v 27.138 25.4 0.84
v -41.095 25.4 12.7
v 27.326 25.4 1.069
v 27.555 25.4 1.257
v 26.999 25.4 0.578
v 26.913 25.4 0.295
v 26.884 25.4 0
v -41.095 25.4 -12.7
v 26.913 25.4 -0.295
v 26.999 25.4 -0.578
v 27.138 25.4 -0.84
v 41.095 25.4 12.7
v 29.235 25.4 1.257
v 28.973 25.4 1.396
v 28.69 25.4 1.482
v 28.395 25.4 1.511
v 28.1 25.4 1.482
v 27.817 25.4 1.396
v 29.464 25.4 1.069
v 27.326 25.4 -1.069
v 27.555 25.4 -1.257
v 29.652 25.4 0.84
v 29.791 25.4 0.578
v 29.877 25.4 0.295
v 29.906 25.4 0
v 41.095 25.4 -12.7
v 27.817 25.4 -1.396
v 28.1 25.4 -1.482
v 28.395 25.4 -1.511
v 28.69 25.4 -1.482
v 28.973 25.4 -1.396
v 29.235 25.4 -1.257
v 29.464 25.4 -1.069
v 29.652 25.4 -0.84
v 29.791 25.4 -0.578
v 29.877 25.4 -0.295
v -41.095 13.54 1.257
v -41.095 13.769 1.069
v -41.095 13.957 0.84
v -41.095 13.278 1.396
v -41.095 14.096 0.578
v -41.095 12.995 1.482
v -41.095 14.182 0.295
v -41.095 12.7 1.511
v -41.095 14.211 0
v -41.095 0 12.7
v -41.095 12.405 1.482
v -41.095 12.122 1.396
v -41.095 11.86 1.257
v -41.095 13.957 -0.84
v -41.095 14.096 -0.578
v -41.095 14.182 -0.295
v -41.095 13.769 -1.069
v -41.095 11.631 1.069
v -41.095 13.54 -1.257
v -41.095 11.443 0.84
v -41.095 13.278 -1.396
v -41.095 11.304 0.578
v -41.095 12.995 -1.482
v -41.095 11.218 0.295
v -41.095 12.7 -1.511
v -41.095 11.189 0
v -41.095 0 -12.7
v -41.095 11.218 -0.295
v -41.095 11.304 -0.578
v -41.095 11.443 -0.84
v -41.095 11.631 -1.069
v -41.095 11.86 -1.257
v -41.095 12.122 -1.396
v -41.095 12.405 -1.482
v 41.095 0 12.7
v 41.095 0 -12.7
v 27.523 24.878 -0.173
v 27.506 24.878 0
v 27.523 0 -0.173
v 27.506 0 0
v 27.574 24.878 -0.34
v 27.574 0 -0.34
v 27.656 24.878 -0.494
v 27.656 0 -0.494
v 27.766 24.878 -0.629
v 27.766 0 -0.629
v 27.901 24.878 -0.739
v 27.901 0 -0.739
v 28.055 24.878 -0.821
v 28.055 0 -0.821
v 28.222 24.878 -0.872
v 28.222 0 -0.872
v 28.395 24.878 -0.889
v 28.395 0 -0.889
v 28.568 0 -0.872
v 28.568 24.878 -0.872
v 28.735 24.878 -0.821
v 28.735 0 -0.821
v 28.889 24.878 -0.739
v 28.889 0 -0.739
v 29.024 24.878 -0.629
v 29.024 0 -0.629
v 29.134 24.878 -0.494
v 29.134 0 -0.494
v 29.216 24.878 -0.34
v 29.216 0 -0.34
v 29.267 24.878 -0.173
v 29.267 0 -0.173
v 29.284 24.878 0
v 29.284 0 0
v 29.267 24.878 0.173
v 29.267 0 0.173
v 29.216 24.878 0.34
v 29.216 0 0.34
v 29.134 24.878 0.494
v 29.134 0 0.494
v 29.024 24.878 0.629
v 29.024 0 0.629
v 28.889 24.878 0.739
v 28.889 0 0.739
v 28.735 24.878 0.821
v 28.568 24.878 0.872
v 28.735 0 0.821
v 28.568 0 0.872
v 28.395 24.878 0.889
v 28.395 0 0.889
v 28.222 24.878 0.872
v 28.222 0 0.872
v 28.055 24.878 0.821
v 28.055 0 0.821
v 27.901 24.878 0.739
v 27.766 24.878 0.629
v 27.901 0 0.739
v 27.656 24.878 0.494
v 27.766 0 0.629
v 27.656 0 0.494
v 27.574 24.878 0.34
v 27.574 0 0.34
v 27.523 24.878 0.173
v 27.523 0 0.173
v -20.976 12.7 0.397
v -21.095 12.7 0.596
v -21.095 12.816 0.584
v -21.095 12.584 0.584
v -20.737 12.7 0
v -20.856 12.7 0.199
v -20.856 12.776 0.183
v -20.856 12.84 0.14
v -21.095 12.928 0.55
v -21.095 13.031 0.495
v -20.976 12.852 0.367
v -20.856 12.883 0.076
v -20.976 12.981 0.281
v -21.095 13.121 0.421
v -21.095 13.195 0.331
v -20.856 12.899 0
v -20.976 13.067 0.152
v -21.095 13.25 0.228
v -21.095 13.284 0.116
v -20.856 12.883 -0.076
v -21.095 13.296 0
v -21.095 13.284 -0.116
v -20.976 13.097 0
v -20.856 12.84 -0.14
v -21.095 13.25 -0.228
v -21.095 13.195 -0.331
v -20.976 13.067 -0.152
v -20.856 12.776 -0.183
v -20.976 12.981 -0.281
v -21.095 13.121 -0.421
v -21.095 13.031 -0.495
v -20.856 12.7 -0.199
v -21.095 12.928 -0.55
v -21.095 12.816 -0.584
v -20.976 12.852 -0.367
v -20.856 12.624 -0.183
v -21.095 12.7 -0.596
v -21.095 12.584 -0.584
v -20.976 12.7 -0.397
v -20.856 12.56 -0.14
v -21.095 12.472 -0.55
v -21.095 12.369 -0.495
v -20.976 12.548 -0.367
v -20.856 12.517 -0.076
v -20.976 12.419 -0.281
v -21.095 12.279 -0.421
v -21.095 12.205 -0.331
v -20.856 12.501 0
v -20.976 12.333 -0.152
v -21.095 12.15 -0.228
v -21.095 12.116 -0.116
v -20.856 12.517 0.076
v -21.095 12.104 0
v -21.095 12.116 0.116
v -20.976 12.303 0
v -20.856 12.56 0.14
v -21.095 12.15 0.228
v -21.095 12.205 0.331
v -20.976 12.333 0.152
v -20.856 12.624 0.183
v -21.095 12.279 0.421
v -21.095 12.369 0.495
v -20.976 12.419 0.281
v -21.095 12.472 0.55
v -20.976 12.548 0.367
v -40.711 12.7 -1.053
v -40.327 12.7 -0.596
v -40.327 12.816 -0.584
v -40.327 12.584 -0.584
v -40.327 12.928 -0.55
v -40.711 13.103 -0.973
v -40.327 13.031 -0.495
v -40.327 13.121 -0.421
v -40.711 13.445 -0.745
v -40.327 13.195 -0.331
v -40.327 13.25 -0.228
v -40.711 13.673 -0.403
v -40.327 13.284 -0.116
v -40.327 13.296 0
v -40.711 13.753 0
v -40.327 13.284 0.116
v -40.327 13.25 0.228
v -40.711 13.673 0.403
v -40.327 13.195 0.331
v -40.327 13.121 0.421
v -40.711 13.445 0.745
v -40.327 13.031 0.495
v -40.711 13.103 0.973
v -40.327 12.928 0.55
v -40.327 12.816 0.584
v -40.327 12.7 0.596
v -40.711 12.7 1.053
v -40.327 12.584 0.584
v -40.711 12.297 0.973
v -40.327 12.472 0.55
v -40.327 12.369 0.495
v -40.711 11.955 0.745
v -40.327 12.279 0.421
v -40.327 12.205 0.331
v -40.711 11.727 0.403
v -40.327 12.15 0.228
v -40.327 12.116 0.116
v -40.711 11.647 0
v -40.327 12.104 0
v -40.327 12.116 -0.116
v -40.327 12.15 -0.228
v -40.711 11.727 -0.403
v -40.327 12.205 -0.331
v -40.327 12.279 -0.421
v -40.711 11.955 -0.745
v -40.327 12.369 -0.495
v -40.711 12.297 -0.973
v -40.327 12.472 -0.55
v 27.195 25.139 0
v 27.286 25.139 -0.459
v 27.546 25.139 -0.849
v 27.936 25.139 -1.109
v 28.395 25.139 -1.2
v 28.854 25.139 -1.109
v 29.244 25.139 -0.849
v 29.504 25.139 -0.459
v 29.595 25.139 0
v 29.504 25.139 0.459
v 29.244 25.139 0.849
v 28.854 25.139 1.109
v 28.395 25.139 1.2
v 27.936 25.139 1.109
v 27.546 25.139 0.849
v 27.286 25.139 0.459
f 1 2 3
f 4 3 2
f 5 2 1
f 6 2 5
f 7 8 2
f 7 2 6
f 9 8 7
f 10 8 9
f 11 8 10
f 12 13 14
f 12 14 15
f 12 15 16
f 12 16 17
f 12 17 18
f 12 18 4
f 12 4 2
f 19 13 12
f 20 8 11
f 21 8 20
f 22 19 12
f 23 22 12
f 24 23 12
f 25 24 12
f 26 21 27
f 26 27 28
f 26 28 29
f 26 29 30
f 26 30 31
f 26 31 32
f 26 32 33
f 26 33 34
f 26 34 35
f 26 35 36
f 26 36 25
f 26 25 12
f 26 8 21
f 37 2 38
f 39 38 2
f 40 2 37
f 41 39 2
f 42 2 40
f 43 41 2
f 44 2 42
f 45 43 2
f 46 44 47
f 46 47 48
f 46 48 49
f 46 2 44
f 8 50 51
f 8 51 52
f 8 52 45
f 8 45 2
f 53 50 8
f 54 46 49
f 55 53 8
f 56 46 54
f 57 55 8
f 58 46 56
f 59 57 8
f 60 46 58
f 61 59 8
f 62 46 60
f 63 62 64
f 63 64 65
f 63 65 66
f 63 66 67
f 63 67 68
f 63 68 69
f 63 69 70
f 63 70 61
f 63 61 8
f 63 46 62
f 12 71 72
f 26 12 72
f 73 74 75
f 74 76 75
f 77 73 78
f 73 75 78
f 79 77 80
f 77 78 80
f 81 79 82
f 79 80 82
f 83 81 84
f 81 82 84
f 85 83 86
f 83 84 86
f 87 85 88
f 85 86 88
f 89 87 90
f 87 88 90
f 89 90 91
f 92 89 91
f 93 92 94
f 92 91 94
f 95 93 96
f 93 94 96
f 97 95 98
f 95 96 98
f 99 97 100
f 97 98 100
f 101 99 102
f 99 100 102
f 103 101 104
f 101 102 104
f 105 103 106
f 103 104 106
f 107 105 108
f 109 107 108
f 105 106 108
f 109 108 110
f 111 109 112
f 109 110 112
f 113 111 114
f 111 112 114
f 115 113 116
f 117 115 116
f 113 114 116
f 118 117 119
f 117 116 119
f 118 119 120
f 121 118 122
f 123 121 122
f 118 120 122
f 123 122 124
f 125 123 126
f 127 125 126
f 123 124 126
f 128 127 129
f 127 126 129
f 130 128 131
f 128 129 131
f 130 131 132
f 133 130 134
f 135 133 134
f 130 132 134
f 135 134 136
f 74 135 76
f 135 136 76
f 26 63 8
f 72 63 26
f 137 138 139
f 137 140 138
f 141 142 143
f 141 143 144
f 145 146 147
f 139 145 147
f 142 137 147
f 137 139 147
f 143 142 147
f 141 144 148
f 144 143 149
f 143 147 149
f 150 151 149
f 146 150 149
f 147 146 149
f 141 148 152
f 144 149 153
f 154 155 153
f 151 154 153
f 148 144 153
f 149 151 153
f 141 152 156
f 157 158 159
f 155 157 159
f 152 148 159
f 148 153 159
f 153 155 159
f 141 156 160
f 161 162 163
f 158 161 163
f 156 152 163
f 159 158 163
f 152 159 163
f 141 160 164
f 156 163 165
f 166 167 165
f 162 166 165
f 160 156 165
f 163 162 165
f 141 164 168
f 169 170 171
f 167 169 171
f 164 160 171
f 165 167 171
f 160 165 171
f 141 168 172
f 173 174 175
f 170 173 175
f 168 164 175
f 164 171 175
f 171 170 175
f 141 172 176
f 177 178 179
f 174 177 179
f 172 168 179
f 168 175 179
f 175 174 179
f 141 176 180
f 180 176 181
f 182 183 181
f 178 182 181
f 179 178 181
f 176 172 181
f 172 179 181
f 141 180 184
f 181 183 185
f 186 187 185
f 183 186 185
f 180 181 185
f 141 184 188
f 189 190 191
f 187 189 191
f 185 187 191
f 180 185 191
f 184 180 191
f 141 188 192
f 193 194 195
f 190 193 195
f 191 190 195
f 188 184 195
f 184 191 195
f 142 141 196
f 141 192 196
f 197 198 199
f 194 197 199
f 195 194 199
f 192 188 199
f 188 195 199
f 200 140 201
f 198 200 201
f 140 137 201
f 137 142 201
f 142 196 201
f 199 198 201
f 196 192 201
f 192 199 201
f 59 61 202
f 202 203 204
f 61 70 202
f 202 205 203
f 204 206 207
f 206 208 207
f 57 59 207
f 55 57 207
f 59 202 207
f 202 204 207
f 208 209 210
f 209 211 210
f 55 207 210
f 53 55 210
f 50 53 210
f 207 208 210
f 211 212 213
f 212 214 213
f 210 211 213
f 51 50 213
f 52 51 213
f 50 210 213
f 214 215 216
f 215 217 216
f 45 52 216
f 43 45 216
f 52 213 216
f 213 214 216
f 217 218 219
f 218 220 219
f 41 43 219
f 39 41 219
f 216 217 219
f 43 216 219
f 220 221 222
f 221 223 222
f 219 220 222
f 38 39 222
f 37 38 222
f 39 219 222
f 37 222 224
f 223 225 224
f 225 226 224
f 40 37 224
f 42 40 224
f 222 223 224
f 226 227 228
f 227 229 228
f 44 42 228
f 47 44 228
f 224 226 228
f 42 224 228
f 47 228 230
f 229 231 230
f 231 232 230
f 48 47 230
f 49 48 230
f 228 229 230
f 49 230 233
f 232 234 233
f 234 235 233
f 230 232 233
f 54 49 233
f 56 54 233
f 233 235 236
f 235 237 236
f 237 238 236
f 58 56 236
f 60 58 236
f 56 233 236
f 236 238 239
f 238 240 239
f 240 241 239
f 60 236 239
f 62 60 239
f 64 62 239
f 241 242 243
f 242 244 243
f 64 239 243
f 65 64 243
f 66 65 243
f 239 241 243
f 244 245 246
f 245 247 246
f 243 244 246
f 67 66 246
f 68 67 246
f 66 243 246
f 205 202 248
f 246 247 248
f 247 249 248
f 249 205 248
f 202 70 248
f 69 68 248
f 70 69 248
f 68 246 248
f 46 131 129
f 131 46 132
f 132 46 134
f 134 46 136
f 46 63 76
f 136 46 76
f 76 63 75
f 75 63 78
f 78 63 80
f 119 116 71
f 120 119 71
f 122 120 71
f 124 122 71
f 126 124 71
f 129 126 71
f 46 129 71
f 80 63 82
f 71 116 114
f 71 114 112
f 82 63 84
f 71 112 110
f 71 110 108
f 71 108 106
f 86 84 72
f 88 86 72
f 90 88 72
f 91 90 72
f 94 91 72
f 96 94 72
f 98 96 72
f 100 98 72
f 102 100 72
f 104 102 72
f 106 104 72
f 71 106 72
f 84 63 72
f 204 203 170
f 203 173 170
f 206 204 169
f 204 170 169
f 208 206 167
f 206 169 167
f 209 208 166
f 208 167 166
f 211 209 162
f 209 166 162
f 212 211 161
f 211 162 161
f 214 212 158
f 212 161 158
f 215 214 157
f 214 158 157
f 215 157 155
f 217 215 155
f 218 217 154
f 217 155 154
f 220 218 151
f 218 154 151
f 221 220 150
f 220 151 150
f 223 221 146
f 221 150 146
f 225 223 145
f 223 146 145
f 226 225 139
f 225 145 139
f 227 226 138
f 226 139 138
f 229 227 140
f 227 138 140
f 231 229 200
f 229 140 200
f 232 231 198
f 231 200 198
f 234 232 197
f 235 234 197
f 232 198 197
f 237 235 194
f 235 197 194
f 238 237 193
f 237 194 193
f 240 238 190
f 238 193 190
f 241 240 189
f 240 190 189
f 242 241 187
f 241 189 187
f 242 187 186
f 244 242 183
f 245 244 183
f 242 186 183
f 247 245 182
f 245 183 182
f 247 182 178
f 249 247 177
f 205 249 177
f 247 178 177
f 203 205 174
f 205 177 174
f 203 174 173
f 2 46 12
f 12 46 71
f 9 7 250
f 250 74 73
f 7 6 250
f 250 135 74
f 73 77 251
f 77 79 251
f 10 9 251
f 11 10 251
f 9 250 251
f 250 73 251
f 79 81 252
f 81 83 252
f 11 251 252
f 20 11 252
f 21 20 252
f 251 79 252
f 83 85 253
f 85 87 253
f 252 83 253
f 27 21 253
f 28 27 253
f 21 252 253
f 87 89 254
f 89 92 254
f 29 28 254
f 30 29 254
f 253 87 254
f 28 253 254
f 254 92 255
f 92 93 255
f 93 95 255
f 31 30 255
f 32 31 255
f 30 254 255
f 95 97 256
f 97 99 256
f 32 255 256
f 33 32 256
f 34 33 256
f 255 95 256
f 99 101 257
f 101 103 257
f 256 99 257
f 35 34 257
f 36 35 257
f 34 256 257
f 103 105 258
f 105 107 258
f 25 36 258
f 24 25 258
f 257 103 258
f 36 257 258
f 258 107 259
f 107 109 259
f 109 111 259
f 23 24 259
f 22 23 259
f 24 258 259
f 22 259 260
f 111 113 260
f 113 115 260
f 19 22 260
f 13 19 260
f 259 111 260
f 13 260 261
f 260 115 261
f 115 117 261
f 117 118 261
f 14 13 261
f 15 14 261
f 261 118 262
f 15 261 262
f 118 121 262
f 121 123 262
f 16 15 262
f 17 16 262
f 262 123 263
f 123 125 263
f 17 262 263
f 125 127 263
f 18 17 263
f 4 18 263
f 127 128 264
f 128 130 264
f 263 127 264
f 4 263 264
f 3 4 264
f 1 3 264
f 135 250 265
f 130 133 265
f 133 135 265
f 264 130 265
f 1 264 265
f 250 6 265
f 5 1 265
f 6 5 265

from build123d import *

# Parameters (mm, degrees)
SKETCH1_W                                         = 82.19
SKETCH1_H                                         = 25.4
BOSS_EXTRUDE1_DEPTH                               = 25.4
CSK_FOR_0_FLAT_HEAD_MACHINE_SCREW_100_D           = 1.778
CSK_FOR_0_FLAT_HEAD_MACHINE_SCREW_100_CSINK_D     = 3.0226
CSK_FOR_0_FLAT_HEAD_MACHINE_SCREW_100_CSINK_ANGLE = 100
F_0_80_TAPPED_HOLE1_D                             = 1.19126
F_0_80_TAPPED_HOLE1_DEPTH                         = 20
F_0_80_TAPPED_HOLE1_CSINK_D                       = 3.0226
F_0_80_TAPPED_HOLE1_CSINK_ANGLE                   = 100
F_0_80_TAPPED_HOLE1_TIP                           = 0.357890611


with BuildPart() as part:
    # Sketch1 → Boss-Extrude1 (new body)
    with BuildSketch(Plane(origin=(0, 0, 0), x_dir=(1, 0, 0), z_dir=(0, 1, 0))):
        Rectangle(SKETCH1_W, SKETCH1_H)
    extrude(amount=BOSS_EXTRUDE1_DEPTH)

    # CSK for #0 Flat Head Machine Screw (100)1 (through all)
    with Locations(Plane(origin=(0, 25.4, 0), x_dir=(1, 0, 0), z_dir=(0, 1, 0))):
        with Locations((28.395, 0)):
            CounterSinkHole(CSK_FOR_0_FLAT_HEAD_MACHINE_SCREW_100_D / 2, CSK_FOR_0_FLAT_HEAD_MACHINE_SCREW_100_CSINK_D / 2, counter_sink_angle=CSK_FOR_0_FLAT_HEAD_MACHINE_SCREW_100_CSINK_ANGLE)

    # #0-80 Tapped Hole1
    with Locations(Plane.ZY.offset(41.095)):
        with Locations((0, 12.7)):
            CounterSinkHole(F_0_80_TAPPED_HOLE1_D / 2, F_0_80_TAPPED_HOLE1_CSINK_D / 2, depth=F_0_80_TAPPED_HOLE1_DEPTH, counter_sink_angle=F_0_80_TAPPED_HOLE1_CSINK_ANGLE)
            with Locations((0, 0, -(F_0_80_TAPPED_HOLE1_DEPTH + F_0_80_TAPPED_HOLE1_TIP / 2))):  # 118° drill point
                Cone(0, F_0_80_TAPPED_HOLE1_D / 2, F_0_80_TAPPED_HOLE1_TIP, mode=Mode.SUBTRACT)


solid = part.part
